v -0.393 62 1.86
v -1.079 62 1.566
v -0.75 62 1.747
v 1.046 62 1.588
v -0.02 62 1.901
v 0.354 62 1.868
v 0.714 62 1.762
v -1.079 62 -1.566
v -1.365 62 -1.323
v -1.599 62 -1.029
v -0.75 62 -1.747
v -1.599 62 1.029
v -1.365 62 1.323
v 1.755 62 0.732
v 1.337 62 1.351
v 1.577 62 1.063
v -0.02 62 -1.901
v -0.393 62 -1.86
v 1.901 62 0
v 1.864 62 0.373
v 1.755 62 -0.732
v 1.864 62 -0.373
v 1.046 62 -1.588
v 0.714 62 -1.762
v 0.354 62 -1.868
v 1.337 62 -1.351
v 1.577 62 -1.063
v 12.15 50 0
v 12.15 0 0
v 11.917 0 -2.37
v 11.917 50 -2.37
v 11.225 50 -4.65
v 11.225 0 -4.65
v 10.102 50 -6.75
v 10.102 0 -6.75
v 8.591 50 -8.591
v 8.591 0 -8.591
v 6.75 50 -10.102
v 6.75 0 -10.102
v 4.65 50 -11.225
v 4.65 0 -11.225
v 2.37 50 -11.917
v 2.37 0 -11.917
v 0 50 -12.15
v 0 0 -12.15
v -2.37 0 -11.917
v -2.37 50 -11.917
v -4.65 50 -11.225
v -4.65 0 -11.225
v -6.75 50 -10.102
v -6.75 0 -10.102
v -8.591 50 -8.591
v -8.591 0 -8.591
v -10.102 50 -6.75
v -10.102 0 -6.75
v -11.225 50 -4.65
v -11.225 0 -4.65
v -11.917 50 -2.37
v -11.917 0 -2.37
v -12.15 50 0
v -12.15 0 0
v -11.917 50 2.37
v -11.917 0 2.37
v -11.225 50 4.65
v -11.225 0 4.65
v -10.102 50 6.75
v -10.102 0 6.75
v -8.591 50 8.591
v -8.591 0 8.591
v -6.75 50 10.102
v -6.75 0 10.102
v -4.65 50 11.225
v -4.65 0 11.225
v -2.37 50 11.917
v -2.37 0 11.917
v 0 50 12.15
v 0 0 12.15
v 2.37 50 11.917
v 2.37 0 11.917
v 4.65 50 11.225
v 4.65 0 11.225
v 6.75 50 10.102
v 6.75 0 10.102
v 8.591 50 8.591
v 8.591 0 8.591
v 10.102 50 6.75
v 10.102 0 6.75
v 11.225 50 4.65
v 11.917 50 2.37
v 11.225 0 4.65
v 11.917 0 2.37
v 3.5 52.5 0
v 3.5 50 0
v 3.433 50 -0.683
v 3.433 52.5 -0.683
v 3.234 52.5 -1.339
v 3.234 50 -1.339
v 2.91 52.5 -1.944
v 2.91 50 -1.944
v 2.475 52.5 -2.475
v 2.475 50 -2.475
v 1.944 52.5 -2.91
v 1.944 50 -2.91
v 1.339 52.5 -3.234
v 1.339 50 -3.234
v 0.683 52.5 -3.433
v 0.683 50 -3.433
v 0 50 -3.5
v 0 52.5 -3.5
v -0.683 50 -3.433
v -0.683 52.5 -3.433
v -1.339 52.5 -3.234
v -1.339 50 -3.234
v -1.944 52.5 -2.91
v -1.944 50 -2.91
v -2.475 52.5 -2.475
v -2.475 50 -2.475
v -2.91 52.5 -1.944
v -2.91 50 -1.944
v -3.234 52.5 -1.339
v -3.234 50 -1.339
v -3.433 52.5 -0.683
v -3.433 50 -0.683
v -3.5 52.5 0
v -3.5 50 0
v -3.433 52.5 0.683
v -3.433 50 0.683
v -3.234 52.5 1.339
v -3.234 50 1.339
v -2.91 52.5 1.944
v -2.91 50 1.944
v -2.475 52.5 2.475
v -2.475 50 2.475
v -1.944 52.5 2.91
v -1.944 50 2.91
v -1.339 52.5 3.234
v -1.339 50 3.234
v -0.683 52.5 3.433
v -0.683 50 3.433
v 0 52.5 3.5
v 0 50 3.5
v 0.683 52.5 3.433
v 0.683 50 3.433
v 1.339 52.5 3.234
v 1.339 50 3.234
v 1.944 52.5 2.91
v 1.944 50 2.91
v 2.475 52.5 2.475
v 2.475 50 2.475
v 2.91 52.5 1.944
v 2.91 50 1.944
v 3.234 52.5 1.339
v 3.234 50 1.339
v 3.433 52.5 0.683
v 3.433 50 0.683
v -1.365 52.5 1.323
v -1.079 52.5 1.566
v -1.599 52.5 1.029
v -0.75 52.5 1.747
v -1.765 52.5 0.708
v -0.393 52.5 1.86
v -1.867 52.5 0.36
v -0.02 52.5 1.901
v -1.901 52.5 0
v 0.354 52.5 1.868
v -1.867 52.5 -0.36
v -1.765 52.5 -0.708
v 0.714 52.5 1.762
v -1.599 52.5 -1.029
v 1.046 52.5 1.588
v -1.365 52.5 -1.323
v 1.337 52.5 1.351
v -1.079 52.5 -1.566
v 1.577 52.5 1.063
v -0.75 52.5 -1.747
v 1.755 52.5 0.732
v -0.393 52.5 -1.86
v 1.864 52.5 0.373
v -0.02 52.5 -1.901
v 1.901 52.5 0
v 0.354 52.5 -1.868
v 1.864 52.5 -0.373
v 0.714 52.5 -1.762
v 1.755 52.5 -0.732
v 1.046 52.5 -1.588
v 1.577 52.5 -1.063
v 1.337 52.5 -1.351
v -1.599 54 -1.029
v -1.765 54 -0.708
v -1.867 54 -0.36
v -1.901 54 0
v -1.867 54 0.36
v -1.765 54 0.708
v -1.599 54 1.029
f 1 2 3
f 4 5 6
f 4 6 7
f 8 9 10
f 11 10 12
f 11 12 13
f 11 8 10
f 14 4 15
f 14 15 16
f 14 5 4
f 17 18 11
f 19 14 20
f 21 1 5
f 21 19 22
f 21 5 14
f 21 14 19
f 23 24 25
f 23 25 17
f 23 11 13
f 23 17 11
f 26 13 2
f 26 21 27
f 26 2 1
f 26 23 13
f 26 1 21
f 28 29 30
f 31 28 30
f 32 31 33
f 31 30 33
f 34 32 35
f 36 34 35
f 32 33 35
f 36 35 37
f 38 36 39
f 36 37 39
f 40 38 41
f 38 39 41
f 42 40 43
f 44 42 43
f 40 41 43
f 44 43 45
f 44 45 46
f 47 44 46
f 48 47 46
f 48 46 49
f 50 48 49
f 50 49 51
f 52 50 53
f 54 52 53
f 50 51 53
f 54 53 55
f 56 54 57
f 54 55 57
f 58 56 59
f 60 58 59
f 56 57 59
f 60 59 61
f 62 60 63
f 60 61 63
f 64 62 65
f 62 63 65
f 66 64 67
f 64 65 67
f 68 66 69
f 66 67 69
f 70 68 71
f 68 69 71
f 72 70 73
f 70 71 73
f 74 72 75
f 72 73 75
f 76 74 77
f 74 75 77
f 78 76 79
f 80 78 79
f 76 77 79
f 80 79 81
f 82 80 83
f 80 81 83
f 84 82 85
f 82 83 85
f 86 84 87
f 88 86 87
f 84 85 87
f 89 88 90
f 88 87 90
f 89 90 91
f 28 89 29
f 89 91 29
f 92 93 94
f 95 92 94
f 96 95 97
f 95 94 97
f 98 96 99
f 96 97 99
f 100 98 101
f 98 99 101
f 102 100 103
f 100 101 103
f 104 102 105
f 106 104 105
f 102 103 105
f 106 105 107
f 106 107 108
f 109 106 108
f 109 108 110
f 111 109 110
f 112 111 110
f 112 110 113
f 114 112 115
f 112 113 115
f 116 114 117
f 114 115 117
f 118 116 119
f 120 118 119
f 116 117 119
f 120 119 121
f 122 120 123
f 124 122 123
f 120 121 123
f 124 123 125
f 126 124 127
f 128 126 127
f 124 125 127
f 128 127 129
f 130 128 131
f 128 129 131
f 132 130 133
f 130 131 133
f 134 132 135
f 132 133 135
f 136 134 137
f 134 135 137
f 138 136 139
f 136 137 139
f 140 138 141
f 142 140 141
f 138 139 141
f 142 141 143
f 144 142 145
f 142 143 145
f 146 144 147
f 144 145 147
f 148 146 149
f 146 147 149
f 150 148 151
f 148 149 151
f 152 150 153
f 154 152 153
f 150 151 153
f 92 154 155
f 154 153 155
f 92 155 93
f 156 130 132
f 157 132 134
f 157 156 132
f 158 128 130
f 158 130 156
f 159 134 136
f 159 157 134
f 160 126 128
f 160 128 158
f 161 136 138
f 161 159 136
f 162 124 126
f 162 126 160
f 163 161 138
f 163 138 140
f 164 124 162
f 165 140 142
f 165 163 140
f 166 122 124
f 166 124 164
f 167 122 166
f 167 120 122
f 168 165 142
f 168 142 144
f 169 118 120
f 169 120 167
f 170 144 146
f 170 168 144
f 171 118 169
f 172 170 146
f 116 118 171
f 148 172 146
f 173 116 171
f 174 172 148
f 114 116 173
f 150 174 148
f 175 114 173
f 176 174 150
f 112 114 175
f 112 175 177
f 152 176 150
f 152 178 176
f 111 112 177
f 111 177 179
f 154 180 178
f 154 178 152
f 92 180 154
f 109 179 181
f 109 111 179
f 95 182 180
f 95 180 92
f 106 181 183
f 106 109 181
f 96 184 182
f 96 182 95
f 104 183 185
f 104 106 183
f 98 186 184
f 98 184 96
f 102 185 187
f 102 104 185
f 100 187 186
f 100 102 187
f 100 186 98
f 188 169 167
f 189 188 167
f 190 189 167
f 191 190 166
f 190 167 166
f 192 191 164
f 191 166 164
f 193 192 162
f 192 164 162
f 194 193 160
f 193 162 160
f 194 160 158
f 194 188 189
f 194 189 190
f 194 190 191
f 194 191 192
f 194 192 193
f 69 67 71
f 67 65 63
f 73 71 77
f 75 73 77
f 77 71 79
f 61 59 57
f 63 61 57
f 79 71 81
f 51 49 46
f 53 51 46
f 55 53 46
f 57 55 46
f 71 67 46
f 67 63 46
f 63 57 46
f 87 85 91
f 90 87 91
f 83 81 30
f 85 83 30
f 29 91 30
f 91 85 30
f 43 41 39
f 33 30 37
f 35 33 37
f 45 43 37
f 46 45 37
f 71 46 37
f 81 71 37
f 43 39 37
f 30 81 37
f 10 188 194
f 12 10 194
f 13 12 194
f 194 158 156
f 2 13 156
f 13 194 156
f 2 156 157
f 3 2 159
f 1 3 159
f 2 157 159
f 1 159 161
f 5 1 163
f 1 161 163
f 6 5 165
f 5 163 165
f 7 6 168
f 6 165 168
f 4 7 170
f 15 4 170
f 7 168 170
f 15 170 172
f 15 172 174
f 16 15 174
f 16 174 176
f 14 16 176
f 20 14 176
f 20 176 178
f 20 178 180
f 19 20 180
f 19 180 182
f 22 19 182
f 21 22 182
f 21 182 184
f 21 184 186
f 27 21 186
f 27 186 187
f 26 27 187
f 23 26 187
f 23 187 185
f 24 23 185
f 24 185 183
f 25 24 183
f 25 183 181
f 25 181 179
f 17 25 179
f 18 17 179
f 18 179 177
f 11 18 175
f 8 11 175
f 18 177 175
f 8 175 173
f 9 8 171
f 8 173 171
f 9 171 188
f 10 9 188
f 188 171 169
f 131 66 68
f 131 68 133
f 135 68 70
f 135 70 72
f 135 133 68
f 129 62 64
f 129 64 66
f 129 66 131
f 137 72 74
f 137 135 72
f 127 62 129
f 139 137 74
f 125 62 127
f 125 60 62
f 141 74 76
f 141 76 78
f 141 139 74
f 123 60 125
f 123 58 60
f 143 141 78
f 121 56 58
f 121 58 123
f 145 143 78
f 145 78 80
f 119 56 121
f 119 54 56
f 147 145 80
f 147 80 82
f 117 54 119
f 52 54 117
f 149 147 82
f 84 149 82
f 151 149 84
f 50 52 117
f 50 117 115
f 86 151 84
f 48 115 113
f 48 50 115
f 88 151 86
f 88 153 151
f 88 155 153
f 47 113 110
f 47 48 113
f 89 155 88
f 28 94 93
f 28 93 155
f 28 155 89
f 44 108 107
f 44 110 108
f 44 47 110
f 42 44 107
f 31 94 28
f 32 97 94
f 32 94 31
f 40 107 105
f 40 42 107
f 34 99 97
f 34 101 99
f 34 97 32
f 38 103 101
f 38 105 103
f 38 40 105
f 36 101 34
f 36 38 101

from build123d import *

# Parameters (mm, degrees)
SKETCH1_R           = 12.15
BOSS_EXTRUDE1_DEPTH = 50
SKETCH2_R           = 3.5
BOSS_EXTRUDE2_DEPTH = 2.5
BOSS_EXTRUDE3_DEPTH = 9.5
SKETCH4_R           = 1.901379474
BOSS_EXTRUDE4_DEPTH = 1.5


with BuildPart() as part:
    # Sketch1 → Boss-Extrude1 (new body)
    with BuildSketch(Plane(origin=(0, 0, 0), x_dir=(1, 0, 0), z_dir=(0, 1, 0))):
        Circle(SKETCH1_R)
    extrude(amount=BOSS_EXTRUDE1_DEPTH)

    # Sketch2 → Boss-Extrude2 (add)
    with BuildSketch(Plane(origin=(0, 50, 0), x_dir=(1, 0, 0), z_dir=(0, 1, 0))):
        Circle(SKETCH2_R)
    extrude(amount=BOSS_EXTRUDE2_DEPTH)

    # Sketch3 → Boss-Extrude3 (add)
    with BuildSketch(Plane(origin=(0, 52.5, 0), x_dir=(1, 0, 0), z_dir=(0, 1, 0))):
        with BuildLine():
            Line((-1.598620526, 1.029396092), (-1.598620526, -1.029396092))
            ThreePointArc((-1.598620526, -1.029396092), (1.901379474, 0), (-1.598620526, 1.029396092))
        make_face()
    extrude(amount=BOSS_EXTRUDE3_DEPTH)

    # Sketch4 → Boss-Extrude4 (add)
    with BuildSketch(Plane(origin=(0, 52.5, 0), x_dir=(1, 0, 0), z_dir=(0, 1, 0))):
        Circle(SKETCH4_R)
    extrude(amount=BOSS_EXTRUDE4_DEPTH)


solid = part.part
